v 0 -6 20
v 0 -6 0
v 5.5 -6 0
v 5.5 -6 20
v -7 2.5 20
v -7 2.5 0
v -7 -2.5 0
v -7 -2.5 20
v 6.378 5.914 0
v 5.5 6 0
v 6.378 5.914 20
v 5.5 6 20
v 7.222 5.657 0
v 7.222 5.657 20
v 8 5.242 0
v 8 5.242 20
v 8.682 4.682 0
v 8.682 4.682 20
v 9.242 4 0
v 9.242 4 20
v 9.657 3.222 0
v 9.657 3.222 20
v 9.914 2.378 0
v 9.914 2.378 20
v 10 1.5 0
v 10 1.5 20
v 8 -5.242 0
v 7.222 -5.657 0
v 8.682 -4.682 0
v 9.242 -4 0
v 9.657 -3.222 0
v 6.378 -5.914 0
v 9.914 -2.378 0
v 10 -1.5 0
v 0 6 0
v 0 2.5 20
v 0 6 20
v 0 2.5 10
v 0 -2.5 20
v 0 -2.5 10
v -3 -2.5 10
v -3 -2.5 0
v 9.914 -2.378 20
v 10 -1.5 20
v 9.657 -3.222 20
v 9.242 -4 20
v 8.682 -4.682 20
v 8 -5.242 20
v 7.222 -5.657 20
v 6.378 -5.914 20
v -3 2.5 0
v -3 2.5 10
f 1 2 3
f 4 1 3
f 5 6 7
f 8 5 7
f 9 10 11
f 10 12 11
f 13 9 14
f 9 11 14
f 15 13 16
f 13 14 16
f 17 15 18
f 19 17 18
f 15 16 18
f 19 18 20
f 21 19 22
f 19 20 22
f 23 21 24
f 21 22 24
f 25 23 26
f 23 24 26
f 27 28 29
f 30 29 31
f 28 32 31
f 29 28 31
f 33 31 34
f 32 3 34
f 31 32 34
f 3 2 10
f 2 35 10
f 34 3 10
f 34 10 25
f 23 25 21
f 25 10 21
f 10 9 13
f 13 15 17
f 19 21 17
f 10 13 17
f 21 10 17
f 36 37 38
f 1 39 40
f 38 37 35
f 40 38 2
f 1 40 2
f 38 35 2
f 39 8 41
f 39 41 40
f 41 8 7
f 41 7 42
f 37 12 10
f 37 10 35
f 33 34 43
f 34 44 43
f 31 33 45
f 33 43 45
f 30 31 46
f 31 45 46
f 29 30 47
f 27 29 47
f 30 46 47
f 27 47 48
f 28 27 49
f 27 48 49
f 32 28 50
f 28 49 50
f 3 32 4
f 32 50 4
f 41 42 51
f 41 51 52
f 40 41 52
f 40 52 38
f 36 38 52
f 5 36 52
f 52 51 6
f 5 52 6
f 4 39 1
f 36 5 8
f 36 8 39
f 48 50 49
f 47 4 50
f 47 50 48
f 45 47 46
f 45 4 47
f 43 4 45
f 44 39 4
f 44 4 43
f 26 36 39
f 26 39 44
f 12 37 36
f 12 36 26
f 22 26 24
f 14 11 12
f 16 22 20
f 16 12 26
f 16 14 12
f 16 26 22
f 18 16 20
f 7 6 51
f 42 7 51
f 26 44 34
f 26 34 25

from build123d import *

# Parameters (mm, degrees)
PAD_DEPTH    = 20
SKETCH001_W  = 3
SKETCH001_H  = 10
POCKET_DEPTH = 8.501
FILLET_R     = 4.5


with BuildPart() as part:
    # Sketch → Pad (new body)
    with BuildSketch(Plane.XY):
        Polygon((-7, 2.5), (-7, -2.5), (0, -2.5), (0, -6), (10, -6), (10, 6), (0, 6), (0, 2.5), align=None)
    extrude(amount=PAD_DEPTH)

    # Sketch001 (on DatumPlane) → Pocket (cut, through all)
    with BuildSketch(Plane.XZ.offset(2.5)):
        with Locations((-1.5, 5)):
            Rectangle(SKETCH001_W, SKETCH001_H)
    extrude(amount=-POCKET_DEPTH, mode=Mode.SUBTRACT)

    # Fillet
    fillet_edges = [part.edges().sort_by_distance(p)[0] for p in [
        (10, 6, 10),
        (10, -6, 10),
    ]]
    fillet(fillet_edges, radius=FILLET_R)


solid = part.part
